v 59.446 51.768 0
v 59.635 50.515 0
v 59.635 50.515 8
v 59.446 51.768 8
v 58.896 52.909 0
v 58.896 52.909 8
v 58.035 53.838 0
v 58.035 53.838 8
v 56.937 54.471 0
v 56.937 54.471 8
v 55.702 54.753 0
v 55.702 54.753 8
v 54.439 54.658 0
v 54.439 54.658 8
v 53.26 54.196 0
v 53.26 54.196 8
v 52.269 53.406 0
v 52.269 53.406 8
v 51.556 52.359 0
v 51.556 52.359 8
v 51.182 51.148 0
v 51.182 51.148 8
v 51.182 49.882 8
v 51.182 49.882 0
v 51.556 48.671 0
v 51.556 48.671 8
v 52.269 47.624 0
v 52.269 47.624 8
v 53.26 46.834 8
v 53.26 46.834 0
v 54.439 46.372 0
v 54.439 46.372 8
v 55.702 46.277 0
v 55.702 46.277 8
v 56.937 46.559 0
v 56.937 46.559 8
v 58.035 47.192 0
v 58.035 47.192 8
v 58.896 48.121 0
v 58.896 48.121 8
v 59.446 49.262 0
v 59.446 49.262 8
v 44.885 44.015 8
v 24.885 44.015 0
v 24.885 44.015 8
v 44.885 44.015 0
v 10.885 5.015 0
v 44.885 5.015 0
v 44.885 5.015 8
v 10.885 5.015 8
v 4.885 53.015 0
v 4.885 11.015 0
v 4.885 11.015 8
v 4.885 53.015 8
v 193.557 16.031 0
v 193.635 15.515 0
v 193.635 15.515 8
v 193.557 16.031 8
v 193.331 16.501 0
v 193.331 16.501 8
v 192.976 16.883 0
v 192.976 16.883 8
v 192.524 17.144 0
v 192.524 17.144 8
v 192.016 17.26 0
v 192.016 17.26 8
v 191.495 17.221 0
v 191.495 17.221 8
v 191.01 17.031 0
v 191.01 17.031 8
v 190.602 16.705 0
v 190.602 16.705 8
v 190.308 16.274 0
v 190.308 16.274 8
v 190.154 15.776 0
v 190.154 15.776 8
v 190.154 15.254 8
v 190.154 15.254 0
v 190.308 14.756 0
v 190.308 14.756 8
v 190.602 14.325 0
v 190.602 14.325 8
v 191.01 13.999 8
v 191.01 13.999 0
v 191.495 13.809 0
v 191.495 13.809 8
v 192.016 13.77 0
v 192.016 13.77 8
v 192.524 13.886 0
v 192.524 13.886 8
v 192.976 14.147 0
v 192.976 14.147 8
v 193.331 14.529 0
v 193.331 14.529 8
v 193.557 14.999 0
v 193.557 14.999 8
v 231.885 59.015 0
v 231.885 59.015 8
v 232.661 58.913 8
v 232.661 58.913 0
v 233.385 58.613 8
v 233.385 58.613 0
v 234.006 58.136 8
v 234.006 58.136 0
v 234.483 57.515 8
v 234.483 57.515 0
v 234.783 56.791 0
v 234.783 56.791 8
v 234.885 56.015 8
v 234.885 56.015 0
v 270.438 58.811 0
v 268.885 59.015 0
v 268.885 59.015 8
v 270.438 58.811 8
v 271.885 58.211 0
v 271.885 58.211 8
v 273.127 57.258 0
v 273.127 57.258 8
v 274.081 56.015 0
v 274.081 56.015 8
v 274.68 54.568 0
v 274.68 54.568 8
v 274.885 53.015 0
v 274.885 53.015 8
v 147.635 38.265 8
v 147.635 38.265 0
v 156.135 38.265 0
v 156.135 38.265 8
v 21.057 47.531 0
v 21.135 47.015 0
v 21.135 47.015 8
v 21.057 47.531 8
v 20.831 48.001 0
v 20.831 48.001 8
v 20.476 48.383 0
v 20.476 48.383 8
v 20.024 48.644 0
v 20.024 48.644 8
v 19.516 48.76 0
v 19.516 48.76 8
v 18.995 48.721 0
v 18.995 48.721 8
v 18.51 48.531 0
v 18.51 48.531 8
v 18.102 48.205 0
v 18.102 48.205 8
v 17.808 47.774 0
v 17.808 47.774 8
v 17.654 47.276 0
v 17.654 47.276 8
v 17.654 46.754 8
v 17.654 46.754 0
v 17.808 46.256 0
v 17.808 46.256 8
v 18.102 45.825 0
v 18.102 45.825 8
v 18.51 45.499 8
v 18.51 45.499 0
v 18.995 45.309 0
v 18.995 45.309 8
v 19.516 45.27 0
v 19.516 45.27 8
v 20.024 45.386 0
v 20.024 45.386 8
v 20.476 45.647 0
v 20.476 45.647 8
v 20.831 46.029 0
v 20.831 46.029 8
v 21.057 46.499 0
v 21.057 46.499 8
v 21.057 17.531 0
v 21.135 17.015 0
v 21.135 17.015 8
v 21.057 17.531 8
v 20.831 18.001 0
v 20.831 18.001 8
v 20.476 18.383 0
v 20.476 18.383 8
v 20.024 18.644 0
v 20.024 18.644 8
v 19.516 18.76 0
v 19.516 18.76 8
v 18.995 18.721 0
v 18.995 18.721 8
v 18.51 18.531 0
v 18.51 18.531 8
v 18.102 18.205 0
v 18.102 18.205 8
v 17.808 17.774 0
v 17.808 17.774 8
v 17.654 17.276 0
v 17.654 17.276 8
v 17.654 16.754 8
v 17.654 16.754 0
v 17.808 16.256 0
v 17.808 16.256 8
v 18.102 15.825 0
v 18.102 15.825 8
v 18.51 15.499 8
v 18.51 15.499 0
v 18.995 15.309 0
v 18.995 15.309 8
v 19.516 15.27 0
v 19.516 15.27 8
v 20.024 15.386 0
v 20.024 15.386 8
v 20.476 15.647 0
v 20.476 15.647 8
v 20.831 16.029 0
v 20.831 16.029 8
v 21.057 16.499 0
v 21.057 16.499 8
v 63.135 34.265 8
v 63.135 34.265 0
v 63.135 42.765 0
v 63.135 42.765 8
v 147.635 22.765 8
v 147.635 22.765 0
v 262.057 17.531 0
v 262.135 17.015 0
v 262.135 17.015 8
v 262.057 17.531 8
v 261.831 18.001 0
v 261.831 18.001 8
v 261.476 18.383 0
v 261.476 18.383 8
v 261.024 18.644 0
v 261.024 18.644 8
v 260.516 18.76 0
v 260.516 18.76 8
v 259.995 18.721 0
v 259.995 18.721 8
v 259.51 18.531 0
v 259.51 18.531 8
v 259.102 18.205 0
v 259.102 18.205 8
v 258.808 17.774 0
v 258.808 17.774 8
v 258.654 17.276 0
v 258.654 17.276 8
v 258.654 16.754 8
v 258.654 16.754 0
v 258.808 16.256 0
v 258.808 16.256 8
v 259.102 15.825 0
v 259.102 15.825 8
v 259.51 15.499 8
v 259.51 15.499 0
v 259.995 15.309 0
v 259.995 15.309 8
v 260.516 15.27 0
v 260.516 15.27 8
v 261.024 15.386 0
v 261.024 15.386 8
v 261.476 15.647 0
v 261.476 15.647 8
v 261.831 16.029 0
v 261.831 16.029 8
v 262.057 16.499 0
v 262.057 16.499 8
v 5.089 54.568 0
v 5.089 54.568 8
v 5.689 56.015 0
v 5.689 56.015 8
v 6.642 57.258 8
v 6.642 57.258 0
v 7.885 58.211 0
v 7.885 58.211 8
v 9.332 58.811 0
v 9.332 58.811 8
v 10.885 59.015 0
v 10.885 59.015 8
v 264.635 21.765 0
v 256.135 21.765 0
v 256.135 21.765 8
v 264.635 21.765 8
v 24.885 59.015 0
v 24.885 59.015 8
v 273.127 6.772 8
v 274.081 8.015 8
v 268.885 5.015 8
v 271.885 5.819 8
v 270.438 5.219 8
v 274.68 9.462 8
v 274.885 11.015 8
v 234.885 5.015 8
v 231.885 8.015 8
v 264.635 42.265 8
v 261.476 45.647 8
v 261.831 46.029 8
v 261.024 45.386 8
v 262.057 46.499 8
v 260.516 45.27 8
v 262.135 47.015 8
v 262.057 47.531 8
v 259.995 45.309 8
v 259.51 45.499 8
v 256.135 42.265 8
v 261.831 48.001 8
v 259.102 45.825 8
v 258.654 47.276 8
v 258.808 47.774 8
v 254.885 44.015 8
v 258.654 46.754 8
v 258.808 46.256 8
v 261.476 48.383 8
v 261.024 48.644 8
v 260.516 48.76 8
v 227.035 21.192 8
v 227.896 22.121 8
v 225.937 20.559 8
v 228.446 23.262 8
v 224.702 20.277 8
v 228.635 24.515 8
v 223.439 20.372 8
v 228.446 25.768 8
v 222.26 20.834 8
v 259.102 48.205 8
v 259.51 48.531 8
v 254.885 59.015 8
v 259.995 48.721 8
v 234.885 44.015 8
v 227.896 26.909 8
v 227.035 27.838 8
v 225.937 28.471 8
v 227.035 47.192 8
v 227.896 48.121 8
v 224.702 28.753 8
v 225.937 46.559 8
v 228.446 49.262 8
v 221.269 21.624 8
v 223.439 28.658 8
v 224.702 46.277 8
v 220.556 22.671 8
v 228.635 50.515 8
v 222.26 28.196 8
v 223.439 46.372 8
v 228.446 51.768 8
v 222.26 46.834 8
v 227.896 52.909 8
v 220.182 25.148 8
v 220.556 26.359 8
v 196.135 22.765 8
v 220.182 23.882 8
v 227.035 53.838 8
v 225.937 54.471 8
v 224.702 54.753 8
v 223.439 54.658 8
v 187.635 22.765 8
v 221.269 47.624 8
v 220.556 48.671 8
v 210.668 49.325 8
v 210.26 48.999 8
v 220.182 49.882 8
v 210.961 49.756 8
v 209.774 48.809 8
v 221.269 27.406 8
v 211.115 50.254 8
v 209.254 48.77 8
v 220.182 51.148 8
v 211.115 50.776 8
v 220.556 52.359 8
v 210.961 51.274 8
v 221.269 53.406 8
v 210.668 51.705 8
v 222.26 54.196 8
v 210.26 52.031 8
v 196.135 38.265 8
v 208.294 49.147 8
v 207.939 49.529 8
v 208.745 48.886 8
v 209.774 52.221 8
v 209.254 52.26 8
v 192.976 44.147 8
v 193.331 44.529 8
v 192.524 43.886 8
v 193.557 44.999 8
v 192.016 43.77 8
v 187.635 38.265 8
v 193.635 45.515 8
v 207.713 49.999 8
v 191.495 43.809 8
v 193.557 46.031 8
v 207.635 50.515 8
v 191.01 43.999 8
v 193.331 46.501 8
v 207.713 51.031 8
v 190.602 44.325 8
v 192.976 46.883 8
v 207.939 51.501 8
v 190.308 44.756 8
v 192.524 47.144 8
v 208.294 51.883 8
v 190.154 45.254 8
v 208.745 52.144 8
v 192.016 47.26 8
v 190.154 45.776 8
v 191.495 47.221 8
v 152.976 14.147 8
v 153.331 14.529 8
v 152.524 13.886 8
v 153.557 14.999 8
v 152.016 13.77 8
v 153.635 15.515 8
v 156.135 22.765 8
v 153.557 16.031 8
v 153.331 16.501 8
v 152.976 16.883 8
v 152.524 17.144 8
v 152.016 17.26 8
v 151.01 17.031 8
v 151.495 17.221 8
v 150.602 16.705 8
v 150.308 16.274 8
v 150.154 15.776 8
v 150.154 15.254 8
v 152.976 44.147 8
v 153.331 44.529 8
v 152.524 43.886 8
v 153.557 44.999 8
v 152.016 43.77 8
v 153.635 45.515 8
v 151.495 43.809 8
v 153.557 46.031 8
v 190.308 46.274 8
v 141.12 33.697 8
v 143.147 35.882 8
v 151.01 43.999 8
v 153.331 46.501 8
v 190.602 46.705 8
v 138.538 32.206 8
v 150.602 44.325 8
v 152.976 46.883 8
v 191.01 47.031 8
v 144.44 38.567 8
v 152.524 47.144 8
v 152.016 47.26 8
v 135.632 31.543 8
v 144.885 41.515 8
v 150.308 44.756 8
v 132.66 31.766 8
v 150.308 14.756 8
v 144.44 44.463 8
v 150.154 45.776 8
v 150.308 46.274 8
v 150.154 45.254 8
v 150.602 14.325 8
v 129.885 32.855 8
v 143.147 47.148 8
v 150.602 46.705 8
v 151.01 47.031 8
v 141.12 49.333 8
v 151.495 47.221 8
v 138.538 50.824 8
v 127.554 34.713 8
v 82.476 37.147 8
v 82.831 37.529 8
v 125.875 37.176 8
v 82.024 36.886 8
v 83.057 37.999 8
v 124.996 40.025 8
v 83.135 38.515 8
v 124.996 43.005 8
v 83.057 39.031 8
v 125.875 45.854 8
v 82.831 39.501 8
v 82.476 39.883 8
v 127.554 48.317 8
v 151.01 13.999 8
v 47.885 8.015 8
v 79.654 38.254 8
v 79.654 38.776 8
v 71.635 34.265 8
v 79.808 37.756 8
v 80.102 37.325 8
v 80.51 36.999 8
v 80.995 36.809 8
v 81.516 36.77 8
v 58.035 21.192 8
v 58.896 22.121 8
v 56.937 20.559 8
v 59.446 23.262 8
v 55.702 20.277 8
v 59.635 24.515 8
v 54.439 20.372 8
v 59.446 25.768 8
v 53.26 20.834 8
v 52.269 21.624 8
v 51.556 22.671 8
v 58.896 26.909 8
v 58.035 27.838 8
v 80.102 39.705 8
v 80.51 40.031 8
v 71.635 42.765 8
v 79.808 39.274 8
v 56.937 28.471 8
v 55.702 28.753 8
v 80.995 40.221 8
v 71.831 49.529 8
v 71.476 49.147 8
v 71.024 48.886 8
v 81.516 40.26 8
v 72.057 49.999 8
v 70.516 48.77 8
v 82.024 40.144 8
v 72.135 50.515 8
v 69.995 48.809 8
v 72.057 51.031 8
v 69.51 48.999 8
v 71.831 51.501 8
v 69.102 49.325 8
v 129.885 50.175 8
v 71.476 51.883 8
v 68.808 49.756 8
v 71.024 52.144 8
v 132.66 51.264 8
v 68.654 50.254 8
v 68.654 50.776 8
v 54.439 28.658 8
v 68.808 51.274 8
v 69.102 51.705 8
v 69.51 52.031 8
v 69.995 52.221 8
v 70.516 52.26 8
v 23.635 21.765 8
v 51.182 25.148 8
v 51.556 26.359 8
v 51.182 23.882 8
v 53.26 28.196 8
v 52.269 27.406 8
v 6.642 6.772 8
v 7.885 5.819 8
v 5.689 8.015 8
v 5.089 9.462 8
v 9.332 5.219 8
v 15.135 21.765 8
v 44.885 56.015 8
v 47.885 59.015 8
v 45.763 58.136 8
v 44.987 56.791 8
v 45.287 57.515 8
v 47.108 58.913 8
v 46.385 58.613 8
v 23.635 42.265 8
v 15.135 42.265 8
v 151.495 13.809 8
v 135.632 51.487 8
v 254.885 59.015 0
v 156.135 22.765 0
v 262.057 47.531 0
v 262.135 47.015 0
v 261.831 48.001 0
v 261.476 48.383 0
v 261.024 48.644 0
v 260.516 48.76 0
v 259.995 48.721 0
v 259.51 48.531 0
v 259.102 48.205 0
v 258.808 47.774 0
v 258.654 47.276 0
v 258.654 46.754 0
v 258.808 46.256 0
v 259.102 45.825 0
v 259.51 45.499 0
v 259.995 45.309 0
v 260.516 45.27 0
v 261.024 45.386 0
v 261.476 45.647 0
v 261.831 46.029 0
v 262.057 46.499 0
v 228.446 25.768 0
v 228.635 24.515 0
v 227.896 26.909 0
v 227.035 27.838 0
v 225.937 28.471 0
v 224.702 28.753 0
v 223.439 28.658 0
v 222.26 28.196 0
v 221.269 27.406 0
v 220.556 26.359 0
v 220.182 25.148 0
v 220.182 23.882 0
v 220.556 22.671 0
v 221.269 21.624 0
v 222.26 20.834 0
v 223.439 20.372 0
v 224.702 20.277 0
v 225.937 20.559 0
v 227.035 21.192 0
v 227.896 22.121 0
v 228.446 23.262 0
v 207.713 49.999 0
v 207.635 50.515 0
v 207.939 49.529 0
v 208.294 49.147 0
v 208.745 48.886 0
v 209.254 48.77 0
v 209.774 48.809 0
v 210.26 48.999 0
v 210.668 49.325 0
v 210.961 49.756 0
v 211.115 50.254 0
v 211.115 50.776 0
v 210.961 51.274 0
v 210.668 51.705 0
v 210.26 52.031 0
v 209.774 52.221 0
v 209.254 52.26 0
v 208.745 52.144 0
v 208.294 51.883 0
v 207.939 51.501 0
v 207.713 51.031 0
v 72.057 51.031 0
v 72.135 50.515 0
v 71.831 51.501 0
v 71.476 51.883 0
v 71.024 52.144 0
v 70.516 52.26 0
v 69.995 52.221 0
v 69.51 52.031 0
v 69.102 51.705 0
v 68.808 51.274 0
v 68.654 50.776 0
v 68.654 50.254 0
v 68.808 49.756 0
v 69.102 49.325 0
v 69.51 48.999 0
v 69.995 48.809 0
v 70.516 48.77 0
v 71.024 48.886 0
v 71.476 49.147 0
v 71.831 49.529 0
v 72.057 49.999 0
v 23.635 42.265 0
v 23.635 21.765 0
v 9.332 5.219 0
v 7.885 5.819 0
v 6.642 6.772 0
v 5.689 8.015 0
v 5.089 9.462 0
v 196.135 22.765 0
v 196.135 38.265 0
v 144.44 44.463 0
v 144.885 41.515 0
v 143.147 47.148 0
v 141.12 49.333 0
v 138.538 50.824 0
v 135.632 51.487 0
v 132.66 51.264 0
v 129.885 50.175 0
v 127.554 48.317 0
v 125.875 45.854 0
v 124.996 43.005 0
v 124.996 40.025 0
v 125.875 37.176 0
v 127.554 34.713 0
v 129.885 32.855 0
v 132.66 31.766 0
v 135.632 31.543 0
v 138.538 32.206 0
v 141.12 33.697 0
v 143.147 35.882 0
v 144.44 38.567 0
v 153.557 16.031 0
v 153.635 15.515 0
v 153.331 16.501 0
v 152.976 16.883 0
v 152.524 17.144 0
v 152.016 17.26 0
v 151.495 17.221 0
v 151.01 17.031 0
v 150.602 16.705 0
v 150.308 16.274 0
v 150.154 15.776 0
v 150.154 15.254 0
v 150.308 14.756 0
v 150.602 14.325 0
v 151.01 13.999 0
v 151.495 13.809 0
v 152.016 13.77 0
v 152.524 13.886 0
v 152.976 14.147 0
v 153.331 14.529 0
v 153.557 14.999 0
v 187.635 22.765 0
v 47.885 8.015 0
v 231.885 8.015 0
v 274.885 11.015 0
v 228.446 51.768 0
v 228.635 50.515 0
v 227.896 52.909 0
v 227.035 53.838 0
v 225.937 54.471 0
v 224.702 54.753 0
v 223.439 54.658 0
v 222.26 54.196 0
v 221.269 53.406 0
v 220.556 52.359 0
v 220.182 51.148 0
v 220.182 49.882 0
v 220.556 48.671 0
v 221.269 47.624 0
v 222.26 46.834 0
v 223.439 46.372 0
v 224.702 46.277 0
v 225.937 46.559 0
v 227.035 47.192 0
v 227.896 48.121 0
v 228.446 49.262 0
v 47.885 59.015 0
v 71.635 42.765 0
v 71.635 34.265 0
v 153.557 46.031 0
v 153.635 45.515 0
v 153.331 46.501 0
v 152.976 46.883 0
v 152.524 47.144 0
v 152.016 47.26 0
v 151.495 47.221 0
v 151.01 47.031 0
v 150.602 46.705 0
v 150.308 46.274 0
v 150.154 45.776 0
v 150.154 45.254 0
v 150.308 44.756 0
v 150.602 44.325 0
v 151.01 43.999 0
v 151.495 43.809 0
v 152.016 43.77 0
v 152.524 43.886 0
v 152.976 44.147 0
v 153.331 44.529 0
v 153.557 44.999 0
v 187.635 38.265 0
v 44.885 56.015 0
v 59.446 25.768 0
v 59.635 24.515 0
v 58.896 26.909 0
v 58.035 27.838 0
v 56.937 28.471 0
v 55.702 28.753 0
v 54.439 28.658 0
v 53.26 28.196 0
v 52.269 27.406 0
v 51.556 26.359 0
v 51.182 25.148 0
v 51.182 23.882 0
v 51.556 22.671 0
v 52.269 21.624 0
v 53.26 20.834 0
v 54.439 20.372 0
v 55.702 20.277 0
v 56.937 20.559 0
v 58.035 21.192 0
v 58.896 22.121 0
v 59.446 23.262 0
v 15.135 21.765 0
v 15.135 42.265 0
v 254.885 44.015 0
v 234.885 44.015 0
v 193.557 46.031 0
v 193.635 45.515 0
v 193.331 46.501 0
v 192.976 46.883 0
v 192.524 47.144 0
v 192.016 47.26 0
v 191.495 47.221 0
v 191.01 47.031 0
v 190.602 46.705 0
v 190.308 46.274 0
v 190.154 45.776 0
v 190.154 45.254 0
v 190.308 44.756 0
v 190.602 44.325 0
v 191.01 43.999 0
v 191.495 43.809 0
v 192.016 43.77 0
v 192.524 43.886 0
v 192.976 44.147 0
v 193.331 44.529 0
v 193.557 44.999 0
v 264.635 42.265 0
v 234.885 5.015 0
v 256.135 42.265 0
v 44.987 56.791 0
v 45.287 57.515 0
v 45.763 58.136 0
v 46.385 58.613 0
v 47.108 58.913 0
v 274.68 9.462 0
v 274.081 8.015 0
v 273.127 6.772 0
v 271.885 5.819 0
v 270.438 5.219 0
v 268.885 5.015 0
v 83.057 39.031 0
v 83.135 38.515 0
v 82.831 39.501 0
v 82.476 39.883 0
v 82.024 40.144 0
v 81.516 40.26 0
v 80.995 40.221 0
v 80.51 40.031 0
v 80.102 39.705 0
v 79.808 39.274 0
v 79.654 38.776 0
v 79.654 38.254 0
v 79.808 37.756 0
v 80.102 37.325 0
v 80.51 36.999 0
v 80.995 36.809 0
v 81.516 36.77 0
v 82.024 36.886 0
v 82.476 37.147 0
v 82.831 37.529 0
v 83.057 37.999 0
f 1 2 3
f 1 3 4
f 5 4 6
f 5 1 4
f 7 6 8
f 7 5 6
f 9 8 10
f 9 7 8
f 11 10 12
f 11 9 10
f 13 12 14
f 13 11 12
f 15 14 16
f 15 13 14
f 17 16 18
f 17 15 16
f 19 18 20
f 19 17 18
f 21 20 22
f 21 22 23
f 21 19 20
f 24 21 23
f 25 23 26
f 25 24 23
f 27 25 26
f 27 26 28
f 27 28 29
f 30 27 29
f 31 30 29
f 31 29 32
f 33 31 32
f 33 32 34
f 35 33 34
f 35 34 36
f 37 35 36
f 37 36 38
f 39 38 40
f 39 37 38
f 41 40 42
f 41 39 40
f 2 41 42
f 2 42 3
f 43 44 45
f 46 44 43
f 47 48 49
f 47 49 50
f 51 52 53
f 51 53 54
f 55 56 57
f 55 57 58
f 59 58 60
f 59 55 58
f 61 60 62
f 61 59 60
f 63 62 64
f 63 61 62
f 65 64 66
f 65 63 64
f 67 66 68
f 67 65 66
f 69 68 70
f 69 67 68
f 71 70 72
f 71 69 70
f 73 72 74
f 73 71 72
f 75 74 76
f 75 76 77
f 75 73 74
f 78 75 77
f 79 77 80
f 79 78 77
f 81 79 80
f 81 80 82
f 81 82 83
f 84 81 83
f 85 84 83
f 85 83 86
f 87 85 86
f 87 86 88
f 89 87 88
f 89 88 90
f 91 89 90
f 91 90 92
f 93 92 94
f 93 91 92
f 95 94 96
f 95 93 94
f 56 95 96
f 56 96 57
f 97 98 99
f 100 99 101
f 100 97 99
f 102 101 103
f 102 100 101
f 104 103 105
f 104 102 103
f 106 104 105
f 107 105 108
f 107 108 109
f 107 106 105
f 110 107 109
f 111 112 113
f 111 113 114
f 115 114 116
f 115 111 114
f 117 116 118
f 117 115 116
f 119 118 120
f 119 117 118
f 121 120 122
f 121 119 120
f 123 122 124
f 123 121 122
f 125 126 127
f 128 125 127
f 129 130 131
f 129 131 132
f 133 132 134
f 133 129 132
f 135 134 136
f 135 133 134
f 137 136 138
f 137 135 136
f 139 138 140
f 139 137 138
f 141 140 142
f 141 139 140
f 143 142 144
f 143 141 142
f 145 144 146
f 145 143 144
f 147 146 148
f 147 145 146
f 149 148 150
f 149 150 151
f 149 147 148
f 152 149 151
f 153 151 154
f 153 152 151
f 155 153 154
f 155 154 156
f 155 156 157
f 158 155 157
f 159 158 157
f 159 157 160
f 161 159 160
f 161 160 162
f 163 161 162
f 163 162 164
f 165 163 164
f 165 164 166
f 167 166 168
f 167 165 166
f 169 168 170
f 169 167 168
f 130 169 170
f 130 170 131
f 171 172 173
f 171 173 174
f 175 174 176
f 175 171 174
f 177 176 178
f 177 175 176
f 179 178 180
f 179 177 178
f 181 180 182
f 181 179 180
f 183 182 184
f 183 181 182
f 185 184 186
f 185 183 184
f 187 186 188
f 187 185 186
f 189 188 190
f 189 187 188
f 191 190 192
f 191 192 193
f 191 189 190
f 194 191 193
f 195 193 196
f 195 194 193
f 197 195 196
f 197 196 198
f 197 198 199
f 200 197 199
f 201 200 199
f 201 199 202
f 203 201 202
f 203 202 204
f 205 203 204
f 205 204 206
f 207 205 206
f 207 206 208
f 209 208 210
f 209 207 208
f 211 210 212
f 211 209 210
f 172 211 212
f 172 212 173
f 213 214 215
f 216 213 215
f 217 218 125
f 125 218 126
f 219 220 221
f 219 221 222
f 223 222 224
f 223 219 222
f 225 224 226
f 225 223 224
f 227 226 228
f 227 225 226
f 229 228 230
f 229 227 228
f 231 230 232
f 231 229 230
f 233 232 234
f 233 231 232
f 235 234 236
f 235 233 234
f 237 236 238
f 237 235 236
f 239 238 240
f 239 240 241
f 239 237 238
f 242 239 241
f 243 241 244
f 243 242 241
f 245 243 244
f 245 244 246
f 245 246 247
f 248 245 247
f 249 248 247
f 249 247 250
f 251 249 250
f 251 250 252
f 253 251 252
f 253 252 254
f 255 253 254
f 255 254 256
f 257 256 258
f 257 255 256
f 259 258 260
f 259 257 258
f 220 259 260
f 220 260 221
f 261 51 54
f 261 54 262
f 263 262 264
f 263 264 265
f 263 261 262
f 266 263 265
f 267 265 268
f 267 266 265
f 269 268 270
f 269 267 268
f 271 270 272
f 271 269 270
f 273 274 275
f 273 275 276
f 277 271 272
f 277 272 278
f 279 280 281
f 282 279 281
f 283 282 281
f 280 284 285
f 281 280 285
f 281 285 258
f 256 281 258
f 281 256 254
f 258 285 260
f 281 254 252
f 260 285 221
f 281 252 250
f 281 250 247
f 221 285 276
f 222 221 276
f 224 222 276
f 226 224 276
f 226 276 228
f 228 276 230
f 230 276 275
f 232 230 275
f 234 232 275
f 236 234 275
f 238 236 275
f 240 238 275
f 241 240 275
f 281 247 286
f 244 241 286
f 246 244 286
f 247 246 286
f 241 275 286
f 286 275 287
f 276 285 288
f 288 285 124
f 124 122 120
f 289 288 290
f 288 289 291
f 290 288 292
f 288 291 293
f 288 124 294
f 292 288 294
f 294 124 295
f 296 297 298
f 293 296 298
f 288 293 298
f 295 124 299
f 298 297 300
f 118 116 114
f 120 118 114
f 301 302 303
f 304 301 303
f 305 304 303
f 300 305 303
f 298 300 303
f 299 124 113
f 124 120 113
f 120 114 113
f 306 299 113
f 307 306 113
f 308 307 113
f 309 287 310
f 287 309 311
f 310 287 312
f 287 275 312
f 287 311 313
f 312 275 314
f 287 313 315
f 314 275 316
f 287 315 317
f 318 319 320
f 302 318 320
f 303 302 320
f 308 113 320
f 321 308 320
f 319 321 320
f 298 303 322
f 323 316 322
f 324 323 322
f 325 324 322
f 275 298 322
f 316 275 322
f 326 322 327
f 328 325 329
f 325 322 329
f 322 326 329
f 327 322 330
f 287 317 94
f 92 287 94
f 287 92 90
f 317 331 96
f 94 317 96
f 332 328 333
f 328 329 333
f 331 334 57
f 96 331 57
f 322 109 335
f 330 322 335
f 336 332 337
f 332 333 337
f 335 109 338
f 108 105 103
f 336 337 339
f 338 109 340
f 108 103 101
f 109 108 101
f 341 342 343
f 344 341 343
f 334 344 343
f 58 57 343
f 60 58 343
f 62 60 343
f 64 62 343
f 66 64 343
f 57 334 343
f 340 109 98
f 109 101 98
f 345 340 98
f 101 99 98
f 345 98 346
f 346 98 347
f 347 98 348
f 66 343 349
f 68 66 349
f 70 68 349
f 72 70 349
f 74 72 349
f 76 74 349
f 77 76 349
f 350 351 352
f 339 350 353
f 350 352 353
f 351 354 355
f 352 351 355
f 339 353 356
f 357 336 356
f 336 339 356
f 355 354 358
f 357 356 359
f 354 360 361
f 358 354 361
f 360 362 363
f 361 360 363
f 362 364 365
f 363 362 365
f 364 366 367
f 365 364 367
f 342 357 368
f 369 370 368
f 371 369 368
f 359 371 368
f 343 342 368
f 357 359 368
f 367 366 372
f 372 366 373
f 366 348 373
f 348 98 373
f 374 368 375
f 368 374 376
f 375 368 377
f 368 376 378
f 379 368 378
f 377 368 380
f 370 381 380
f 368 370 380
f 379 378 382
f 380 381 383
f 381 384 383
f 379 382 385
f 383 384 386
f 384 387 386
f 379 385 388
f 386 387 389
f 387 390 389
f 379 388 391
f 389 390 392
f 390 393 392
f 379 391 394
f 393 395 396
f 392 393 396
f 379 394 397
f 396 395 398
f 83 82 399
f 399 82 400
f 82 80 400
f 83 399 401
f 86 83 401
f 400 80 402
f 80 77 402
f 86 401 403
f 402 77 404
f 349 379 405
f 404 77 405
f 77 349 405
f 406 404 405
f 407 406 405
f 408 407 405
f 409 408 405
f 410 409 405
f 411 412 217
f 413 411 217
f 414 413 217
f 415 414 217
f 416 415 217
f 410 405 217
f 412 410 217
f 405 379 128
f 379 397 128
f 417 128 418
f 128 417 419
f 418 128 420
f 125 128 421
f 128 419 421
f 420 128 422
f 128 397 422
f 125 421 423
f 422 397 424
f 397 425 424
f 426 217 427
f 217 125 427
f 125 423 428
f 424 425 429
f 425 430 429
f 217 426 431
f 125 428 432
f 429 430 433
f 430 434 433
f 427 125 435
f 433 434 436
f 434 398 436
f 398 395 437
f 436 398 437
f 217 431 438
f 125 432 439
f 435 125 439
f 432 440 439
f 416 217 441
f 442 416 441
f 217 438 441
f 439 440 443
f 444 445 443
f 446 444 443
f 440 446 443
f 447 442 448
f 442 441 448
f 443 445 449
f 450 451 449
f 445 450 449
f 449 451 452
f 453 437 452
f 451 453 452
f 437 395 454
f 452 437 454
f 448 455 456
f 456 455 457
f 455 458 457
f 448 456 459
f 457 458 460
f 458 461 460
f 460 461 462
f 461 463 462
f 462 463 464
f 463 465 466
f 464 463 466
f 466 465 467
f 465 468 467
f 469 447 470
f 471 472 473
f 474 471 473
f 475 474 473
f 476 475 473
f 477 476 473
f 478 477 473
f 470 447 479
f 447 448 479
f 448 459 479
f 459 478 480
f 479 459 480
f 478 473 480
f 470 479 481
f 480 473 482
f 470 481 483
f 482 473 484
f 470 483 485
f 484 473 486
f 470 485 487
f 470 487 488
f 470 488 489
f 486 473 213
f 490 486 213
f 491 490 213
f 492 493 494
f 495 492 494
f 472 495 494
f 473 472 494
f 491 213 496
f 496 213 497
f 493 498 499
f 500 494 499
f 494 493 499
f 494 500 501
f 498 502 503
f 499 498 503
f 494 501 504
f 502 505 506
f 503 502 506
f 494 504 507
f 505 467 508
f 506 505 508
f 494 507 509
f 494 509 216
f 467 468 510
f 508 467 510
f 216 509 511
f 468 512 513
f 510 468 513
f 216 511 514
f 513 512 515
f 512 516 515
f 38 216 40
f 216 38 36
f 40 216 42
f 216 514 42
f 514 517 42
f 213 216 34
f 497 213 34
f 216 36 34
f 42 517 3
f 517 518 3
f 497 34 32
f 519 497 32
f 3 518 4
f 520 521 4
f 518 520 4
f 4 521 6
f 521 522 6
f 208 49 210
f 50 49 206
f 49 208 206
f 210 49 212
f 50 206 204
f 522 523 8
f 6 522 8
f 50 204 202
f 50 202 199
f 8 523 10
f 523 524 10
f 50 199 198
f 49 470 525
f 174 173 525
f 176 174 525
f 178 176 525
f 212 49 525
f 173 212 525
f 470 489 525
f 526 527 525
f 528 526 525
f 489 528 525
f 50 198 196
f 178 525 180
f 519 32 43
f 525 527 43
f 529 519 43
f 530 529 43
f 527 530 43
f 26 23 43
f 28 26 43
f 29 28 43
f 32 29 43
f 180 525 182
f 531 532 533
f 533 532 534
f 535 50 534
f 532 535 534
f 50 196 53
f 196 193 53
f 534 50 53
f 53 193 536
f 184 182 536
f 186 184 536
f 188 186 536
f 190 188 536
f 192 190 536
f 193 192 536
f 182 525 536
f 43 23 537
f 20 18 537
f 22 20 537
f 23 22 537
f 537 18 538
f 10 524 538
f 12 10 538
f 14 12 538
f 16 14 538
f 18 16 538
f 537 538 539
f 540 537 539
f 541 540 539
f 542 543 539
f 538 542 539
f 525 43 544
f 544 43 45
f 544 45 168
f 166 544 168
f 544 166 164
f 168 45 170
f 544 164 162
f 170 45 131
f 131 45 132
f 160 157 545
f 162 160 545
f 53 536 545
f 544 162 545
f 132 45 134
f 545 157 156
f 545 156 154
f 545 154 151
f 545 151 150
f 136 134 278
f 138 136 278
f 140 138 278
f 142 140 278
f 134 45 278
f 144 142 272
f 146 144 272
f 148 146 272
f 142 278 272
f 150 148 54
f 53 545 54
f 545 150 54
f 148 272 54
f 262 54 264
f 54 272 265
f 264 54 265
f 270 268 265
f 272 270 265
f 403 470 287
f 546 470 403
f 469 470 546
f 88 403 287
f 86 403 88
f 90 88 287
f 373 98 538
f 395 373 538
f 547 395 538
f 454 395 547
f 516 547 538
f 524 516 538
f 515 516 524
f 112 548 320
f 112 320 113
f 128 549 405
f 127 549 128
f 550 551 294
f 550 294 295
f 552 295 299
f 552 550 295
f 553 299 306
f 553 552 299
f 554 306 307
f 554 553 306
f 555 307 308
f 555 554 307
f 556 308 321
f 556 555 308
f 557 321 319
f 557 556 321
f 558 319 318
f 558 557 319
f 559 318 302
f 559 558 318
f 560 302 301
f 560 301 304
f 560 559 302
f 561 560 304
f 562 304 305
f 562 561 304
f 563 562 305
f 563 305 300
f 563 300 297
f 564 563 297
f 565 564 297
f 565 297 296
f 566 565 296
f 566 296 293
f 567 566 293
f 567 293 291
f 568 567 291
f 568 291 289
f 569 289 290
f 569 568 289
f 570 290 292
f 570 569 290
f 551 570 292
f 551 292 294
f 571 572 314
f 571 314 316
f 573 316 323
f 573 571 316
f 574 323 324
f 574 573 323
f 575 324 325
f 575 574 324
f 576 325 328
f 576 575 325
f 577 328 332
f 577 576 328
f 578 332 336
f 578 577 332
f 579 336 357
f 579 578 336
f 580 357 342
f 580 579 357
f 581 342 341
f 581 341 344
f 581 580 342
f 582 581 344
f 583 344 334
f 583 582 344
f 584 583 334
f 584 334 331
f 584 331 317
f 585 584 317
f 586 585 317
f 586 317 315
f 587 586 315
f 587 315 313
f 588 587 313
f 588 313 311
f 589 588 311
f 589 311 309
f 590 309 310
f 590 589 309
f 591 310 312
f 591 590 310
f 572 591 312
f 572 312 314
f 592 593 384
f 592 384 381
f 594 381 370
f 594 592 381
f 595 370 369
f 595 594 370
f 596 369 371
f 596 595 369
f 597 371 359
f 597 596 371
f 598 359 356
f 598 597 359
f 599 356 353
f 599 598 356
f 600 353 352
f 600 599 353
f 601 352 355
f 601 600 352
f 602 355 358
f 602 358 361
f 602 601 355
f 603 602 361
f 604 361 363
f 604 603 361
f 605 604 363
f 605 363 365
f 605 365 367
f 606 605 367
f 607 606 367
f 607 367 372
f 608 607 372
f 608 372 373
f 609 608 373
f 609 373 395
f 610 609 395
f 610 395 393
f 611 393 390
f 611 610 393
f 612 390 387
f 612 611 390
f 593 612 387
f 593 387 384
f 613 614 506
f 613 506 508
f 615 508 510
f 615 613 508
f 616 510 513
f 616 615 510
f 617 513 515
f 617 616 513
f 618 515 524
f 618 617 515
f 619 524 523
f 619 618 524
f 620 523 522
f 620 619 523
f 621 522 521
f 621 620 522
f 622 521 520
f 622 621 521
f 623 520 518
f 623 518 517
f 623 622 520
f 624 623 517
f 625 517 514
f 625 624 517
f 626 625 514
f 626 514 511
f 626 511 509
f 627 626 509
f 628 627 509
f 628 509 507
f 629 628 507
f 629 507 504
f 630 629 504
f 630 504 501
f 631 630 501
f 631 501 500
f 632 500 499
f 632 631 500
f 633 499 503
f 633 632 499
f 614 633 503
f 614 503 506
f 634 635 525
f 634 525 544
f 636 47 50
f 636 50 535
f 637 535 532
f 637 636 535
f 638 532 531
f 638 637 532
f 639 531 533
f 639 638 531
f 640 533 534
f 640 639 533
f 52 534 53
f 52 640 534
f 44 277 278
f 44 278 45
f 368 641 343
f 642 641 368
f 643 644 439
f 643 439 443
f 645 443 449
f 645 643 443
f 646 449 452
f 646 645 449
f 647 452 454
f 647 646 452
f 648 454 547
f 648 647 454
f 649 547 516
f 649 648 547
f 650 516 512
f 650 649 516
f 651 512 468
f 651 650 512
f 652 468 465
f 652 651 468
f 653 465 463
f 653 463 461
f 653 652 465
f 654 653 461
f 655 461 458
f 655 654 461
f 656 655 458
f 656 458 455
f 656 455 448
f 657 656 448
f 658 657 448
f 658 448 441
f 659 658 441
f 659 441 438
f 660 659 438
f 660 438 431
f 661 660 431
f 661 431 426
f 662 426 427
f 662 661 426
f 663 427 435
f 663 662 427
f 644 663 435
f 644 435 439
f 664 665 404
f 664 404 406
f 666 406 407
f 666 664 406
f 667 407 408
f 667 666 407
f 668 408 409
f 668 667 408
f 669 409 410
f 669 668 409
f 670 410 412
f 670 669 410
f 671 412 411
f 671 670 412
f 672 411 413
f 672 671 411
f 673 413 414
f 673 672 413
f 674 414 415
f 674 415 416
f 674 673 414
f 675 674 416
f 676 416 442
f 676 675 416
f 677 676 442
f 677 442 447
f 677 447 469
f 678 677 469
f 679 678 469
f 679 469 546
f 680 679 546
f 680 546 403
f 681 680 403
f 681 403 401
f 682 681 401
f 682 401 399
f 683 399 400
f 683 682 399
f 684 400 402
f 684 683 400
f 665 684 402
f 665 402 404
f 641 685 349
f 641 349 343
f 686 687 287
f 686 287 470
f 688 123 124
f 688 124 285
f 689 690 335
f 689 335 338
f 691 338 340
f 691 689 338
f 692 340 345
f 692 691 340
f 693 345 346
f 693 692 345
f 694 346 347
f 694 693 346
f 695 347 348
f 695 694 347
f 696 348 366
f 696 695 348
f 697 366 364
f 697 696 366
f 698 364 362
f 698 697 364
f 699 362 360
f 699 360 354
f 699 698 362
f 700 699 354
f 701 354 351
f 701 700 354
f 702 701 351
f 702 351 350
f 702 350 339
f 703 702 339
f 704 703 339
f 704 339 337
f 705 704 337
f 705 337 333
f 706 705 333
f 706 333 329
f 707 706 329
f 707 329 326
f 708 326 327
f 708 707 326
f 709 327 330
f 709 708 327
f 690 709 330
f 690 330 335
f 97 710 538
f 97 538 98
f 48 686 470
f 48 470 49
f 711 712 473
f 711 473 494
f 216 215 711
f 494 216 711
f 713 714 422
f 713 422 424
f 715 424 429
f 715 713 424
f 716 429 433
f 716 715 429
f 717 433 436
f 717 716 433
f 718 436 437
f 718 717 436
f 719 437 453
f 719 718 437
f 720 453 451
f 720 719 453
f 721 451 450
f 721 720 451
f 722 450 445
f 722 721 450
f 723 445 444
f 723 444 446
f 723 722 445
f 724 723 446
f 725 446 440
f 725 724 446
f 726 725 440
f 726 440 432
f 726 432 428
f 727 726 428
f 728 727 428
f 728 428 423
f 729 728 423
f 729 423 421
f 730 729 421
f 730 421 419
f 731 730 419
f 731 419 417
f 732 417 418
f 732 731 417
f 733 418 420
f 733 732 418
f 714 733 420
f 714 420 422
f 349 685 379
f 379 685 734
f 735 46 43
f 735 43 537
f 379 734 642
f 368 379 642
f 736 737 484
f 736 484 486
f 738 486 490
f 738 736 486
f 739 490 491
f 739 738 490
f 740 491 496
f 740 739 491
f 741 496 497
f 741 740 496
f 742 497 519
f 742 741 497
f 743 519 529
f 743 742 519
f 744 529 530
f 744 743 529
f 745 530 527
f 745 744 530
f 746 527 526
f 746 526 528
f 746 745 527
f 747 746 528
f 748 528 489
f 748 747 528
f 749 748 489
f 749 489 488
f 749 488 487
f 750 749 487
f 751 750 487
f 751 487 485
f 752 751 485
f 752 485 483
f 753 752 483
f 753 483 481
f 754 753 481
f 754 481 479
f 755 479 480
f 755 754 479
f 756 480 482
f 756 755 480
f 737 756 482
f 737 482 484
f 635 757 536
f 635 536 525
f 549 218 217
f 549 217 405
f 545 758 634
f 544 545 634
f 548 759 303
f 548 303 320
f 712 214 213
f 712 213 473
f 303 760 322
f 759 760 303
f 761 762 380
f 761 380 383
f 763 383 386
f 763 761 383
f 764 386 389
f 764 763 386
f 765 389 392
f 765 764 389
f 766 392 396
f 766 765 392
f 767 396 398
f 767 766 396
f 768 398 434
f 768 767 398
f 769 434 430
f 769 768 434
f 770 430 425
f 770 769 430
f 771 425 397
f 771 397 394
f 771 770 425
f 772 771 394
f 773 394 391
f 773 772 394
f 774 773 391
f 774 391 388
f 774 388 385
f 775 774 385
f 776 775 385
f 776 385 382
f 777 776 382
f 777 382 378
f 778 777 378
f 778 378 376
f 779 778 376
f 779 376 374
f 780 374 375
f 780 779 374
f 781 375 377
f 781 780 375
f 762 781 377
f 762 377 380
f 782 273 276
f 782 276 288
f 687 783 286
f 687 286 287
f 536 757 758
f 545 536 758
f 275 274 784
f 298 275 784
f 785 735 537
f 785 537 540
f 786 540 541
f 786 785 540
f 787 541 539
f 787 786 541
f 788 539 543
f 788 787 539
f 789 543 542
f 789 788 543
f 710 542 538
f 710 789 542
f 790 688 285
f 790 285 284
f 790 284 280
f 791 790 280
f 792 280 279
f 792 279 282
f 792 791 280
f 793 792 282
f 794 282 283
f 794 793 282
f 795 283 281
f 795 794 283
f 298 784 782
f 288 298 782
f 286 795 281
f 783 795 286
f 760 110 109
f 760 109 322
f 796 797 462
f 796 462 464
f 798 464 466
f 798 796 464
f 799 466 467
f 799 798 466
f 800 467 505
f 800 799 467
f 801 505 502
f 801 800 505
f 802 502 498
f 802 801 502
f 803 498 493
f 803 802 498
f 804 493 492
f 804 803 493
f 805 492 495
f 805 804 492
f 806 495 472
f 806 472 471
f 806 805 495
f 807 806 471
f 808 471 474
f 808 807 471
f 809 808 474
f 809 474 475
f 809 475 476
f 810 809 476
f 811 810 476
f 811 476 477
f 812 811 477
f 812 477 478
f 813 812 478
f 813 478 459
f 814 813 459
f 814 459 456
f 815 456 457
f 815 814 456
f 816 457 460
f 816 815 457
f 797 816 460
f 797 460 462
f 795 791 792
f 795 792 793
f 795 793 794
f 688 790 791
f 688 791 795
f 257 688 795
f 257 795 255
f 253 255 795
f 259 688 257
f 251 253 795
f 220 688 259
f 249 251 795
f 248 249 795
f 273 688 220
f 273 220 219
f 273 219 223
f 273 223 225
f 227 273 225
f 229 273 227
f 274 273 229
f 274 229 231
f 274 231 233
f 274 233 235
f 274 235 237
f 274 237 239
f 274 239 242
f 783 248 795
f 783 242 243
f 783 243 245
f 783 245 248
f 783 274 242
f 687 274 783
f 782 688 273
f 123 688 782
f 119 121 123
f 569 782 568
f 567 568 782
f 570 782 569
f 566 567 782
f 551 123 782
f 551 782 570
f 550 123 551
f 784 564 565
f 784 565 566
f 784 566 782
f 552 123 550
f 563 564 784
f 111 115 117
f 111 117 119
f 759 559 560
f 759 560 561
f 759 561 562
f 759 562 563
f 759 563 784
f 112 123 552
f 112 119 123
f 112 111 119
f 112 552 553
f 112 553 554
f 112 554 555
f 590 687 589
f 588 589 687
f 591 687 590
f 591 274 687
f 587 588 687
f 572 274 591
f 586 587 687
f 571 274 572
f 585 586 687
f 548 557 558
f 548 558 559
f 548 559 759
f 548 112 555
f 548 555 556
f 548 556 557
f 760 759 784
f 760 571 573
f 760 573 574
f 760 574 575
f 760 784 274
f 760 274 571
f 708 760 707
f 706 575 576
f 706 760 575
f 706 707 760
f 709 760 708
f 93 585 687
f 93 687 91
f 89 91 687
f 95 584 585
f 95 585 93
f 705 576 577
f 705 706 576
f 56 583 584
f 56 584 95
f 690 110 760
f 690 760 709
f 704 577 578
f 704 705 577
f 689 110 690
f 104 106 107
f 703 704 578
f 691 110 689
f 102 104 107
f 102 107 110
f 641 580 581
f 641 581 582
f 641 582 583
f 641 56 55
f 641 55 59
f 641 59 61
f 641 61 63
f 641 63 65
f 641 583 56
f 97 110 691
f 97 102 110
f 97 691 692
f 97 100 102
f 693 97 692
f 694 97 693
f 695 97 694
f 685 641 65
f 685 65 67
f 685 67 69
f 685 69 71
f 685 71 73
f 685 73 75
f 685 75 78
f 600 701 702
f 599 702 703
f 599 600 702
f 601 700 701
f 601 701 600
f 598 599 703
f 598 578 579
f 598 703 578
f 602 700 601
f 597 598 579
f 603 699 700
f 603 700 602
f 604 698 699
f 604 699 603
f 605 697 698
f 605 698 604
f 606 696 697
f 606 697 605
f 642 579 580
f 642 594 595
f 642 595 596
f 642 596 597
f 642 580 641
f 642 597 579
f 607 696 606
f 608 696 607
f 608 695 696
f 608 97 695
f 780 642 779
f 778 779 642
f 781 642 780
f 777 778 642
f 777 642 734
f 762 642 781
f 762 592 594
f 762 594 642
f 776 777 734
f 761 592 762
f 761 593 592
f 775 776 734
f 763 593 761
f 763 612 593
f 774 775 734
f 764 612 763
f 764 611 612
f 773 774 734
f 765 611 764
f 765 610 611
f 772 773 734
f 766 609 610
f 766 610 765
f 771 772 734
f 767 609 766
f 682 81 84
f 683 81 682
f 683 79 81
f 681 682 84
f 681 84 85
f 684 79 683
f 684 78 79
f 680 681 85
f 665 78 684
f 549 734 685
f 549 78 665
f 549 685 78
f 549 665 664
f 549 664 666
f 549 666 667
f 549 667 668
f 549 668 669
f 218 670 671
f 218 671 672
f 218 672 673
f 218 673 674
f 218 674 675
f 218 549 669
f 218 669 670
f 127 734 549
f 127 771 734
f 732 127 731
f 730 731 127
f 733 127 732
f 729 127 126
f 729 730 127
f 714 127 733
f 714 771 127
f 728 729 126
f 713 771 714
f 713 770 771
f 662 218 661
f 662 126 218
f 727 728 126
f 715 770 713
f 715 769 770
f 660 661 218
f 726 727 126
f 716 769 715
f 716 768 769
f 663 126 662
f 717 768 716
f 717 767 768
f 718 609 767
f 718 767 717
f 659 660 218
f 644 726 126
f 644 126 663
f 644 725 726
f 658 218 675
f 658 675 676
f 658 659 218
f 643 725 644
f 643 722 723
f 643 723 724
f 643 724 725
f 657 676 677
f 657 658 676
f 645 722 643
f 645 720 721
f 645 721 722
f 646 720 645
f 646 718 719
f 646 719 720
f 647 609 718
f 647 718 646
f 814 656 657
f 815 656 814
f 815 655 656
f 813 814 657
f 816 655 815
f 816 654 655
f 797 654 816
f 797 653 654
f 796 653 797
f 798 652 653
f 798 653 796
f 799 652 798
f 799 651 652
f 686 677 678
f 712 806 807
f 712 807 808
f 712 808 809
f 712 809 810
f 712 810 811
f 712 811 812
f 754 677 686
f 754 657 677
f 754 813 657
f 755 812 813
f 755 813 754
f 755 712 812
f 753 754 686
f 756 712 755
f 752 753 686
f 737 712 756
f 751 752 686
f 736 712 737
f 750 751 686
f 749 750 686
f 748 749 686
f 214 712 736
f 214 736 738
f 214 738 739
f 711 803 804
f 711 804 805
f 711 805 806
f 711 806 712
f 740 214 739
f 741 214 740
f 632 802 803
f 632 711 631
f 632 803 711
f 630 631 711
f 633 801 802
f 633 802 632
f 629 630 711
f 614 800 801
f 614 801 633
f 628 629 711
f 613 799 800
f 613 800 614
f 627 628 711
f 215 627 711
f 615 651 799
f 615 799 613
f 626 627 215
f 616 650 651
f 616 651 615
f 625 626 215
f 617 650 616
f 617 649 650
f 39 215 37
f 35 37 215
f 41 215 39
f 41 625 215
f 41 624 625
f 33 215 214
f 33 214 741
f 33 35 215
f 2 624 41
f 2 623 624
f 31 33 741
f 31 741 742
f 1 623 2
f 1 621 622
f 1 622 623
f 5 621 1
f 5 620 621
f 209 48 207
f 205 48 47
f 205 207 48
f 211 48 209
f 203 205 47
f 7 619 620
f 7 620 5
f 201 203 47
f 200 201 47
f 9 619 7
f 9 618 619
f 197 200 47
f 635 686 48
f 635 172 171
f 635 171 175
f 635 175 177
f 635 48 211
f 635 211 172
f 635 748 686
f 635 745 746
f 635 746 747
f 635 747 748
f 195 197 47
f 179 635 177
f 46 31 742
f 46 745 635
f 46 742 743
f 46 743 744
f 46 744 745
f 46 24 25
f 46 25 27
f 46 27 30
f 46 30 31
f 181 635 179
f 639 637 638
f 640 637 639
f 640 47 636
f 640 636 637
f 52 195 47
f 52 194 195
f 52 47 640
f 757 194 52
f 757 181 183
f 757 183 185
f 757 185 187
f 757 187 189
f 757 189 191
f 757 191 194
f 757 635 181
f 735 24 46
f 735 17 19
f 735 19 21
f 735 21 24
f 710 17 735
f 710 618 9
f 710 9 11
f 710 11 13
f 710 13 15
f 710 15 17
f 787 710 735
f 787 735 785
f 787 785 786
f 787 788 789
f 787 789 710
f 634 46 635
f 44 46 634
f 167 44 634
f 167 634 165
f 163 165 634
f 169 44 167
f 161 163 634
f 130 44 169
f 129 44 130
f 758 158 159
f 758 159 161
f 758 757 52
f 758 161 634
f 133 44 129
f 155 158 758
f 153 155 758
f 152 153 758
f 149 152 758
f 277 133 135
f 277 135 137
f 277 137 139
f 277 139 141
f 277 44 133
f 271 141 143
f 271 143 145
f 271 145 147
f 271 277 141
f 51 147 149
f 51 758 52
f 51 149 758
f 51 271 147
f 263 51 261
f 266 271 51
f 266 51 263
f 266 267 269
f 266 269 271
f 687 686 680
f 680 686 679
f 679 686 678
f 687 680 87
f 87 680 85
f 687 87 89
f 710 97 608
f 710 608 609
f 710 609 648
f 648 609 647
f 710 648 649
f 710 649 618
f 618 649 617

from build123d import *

# Parameters (mm, degrees)
SKETCH1_R      = 1.75
SKETCH1_R_2    = 4.25
SKETCH1_R_3    = 10
SKETCH1_W      = 8.5
SKETCH1_H      = 20.5
SKETCH1_H_2    = 15.5
SKETCH1_H_3    = 8.5
EXTRUDE1_DEPTH = 8


with BuildPart() as part:
    # Sketch1 → Extrude1 (new body)
    with BuildSketch(Plane.XY):
        with BuildLine():
            Line((234.88475828, 56.014964012), (234.88475828, 44.014964012))
            Line((234.88475828, 44.014964012), (254.88475828, 44.014964012))
            Line((254.88475828, 44.014964012), (254.88475828, 59.014964012))
            Line((254.88475828, 59.014964012), (268.88475828, 59.014964012))
            ThreePointArc((268.88475828, 59.014964012), (273.127398968, 57.257604699), (274.88475828, 53.014964012))
            Line((274.88475828, 53.014964012), (274.88475828, 11.014964012))
            ThreePointArc((274.88475828, 11.014964012), (273.127398968, 6.772323325), (268.88475828, 5.014964012))
            Line((268.88475828, 5.014964012), (234.88475828, 5.014964012))
            Line((234.88475828, 5.014964012), (231.88475828, 8.014964012))
            Line((231.88475828, 8.014964012), (47.88475828, 8.014964012))
            Line((47.88475828, 8.014964012), (44.88475828, 5.014964012))
            Line((44.88475828, 5.014964012), (10.88475828, 5.014964012))
            ThreePointArc((10.88475828, 5.014964012), (6.642117593, 6.772323325), (4.88475828, 11.014964012))
            Line((4.88475828, 11.014964012), (4.88475828, 53.014964012))
            ThreePointArc((4.88475828, 53.014964012), (6.642117593, 57.257604699), (10.88475828, 59.014964012))
            Line((10.88475828, 59.014964012), (24.88475828, 59.014964012))
            Line((24.88475828, 59.014964012), (24.88475828, 44.014964012))
            Line((24.88475828, 44.014964012), (44.88475828, 44.014964012))
            Line((44.88475828, 44.014964012), (44.88475828, 56.014964012))
            ThreePointArc((44.88475828, 56.014964012), (45.763437937, 58.136284356), (47.88475828, 59.014964012))
            Line((47.88475828, 59.014964012), (231.88475828, 59.014964012))
            ThreePointArc((231.88475828, 59.014964012), (234.006078624, 58.136284356), (234.88475828, 56.014964012))
        make_face()
        with Locations((260.38475828, 47.014964012)):
            Circle(SKETCH1_R, mode=Mode.SUBTRACT)
        with Locations((260.38475828, 17.014964012)):
            Circle(SKETCH1_R, mode=Mode.SUBTRACT)
        with Locations((19.38475828, 47.014964012)):
            Circle(SKETCH1_R, mode=Mode.SUBTRACT)
        with Locations((19.38475828, 17.014964012)):
            Circle(SKETCH1_R, mode=Mode.SUBTRACT)
        with Locations((224.38475828, 50.514964012)):
            Circle(SKETCH1_R_2, mode=Mode.SUBTRACT)
        with Locations((224.38475828, 24.514964012)):
            Circle(SKETCH1_R_2, mode=Mode.SUBTRACT)
        with Locations((55.38475828, 50.514964012)):
            Circle(SKETCH1_R_2, mode=Mode.SUBTRACT)
        with Locations((55.38475828, 24.514964012)):
            Circle(SKETCH1_R_2, mode=Mode.SUBTRACT)
        with Locations((191.88475828, 15.514964012)):
            Circle(SKETCH1_R, mode=Mode.SUBTRACT)
        with Locations((191.88475828, 45.514964012)):
            Circle(SKETCH1_R, mode=Mode.SUBTRACT)
        with Locations((151.88475828, 15.514964012)):
            Circle(SKETCH1_R, mode=Mode.SUBTRACT)
        with Locations((151.88475828, 45.514964012)):
            Circle(SKETCH1_R, mode=Mode.SUBTRACT)
        with Locations((81.38475828, 38.514964012)):
            Circle(SKETCH1_R, mode=Mode.SUBTRACT)
        with Locations((70.38475828, 50.514964012)):
            Circle(SKETCH1_R, mode=Mode.SUBTRACT)
        with Locations((134.88475828, 41.514964012)):
            Circle(SKETCH1_R_3, mode=Mode.SUBTRACT)
        with Locations(Location((209.38475828, 50.514964012, 0), (0, 0, 180))):
            Circle(SKETCH1_R, mode=Mode.SUBTRACT)
        with Locations((260.38475828, 32.014964012)):
            Rectangle(SKETCH1_W, SKETCH1_H, mode=Mode.SUBTRACT)
        with Locations((19.38475828, 32.014964012)):
            Rectangle(SKETCH1_W, SKETCH1_H, mode=Mode.SUBTRACT)
        with Locations((191.88475828, 30.514964012)):
            Rectangle(SKETCH1_W, SKETCH1_H_2, mode=Mode.SUBTRACT)
        with Locations((151.88475828, 30.514964012)):
            Rectangle(SKETCH1_W, SKETCH1_H_2, mode=Mode.SUBTRACT)
        with Locations((67.38475828, 38.514964012)):
            Rectangle(SKETCH1_W, SKETCH1_H_3, mode=Mode.SUBTRACT)
    extrude(amount=EXTRUDE1_DEPTH)


solid = part.part
